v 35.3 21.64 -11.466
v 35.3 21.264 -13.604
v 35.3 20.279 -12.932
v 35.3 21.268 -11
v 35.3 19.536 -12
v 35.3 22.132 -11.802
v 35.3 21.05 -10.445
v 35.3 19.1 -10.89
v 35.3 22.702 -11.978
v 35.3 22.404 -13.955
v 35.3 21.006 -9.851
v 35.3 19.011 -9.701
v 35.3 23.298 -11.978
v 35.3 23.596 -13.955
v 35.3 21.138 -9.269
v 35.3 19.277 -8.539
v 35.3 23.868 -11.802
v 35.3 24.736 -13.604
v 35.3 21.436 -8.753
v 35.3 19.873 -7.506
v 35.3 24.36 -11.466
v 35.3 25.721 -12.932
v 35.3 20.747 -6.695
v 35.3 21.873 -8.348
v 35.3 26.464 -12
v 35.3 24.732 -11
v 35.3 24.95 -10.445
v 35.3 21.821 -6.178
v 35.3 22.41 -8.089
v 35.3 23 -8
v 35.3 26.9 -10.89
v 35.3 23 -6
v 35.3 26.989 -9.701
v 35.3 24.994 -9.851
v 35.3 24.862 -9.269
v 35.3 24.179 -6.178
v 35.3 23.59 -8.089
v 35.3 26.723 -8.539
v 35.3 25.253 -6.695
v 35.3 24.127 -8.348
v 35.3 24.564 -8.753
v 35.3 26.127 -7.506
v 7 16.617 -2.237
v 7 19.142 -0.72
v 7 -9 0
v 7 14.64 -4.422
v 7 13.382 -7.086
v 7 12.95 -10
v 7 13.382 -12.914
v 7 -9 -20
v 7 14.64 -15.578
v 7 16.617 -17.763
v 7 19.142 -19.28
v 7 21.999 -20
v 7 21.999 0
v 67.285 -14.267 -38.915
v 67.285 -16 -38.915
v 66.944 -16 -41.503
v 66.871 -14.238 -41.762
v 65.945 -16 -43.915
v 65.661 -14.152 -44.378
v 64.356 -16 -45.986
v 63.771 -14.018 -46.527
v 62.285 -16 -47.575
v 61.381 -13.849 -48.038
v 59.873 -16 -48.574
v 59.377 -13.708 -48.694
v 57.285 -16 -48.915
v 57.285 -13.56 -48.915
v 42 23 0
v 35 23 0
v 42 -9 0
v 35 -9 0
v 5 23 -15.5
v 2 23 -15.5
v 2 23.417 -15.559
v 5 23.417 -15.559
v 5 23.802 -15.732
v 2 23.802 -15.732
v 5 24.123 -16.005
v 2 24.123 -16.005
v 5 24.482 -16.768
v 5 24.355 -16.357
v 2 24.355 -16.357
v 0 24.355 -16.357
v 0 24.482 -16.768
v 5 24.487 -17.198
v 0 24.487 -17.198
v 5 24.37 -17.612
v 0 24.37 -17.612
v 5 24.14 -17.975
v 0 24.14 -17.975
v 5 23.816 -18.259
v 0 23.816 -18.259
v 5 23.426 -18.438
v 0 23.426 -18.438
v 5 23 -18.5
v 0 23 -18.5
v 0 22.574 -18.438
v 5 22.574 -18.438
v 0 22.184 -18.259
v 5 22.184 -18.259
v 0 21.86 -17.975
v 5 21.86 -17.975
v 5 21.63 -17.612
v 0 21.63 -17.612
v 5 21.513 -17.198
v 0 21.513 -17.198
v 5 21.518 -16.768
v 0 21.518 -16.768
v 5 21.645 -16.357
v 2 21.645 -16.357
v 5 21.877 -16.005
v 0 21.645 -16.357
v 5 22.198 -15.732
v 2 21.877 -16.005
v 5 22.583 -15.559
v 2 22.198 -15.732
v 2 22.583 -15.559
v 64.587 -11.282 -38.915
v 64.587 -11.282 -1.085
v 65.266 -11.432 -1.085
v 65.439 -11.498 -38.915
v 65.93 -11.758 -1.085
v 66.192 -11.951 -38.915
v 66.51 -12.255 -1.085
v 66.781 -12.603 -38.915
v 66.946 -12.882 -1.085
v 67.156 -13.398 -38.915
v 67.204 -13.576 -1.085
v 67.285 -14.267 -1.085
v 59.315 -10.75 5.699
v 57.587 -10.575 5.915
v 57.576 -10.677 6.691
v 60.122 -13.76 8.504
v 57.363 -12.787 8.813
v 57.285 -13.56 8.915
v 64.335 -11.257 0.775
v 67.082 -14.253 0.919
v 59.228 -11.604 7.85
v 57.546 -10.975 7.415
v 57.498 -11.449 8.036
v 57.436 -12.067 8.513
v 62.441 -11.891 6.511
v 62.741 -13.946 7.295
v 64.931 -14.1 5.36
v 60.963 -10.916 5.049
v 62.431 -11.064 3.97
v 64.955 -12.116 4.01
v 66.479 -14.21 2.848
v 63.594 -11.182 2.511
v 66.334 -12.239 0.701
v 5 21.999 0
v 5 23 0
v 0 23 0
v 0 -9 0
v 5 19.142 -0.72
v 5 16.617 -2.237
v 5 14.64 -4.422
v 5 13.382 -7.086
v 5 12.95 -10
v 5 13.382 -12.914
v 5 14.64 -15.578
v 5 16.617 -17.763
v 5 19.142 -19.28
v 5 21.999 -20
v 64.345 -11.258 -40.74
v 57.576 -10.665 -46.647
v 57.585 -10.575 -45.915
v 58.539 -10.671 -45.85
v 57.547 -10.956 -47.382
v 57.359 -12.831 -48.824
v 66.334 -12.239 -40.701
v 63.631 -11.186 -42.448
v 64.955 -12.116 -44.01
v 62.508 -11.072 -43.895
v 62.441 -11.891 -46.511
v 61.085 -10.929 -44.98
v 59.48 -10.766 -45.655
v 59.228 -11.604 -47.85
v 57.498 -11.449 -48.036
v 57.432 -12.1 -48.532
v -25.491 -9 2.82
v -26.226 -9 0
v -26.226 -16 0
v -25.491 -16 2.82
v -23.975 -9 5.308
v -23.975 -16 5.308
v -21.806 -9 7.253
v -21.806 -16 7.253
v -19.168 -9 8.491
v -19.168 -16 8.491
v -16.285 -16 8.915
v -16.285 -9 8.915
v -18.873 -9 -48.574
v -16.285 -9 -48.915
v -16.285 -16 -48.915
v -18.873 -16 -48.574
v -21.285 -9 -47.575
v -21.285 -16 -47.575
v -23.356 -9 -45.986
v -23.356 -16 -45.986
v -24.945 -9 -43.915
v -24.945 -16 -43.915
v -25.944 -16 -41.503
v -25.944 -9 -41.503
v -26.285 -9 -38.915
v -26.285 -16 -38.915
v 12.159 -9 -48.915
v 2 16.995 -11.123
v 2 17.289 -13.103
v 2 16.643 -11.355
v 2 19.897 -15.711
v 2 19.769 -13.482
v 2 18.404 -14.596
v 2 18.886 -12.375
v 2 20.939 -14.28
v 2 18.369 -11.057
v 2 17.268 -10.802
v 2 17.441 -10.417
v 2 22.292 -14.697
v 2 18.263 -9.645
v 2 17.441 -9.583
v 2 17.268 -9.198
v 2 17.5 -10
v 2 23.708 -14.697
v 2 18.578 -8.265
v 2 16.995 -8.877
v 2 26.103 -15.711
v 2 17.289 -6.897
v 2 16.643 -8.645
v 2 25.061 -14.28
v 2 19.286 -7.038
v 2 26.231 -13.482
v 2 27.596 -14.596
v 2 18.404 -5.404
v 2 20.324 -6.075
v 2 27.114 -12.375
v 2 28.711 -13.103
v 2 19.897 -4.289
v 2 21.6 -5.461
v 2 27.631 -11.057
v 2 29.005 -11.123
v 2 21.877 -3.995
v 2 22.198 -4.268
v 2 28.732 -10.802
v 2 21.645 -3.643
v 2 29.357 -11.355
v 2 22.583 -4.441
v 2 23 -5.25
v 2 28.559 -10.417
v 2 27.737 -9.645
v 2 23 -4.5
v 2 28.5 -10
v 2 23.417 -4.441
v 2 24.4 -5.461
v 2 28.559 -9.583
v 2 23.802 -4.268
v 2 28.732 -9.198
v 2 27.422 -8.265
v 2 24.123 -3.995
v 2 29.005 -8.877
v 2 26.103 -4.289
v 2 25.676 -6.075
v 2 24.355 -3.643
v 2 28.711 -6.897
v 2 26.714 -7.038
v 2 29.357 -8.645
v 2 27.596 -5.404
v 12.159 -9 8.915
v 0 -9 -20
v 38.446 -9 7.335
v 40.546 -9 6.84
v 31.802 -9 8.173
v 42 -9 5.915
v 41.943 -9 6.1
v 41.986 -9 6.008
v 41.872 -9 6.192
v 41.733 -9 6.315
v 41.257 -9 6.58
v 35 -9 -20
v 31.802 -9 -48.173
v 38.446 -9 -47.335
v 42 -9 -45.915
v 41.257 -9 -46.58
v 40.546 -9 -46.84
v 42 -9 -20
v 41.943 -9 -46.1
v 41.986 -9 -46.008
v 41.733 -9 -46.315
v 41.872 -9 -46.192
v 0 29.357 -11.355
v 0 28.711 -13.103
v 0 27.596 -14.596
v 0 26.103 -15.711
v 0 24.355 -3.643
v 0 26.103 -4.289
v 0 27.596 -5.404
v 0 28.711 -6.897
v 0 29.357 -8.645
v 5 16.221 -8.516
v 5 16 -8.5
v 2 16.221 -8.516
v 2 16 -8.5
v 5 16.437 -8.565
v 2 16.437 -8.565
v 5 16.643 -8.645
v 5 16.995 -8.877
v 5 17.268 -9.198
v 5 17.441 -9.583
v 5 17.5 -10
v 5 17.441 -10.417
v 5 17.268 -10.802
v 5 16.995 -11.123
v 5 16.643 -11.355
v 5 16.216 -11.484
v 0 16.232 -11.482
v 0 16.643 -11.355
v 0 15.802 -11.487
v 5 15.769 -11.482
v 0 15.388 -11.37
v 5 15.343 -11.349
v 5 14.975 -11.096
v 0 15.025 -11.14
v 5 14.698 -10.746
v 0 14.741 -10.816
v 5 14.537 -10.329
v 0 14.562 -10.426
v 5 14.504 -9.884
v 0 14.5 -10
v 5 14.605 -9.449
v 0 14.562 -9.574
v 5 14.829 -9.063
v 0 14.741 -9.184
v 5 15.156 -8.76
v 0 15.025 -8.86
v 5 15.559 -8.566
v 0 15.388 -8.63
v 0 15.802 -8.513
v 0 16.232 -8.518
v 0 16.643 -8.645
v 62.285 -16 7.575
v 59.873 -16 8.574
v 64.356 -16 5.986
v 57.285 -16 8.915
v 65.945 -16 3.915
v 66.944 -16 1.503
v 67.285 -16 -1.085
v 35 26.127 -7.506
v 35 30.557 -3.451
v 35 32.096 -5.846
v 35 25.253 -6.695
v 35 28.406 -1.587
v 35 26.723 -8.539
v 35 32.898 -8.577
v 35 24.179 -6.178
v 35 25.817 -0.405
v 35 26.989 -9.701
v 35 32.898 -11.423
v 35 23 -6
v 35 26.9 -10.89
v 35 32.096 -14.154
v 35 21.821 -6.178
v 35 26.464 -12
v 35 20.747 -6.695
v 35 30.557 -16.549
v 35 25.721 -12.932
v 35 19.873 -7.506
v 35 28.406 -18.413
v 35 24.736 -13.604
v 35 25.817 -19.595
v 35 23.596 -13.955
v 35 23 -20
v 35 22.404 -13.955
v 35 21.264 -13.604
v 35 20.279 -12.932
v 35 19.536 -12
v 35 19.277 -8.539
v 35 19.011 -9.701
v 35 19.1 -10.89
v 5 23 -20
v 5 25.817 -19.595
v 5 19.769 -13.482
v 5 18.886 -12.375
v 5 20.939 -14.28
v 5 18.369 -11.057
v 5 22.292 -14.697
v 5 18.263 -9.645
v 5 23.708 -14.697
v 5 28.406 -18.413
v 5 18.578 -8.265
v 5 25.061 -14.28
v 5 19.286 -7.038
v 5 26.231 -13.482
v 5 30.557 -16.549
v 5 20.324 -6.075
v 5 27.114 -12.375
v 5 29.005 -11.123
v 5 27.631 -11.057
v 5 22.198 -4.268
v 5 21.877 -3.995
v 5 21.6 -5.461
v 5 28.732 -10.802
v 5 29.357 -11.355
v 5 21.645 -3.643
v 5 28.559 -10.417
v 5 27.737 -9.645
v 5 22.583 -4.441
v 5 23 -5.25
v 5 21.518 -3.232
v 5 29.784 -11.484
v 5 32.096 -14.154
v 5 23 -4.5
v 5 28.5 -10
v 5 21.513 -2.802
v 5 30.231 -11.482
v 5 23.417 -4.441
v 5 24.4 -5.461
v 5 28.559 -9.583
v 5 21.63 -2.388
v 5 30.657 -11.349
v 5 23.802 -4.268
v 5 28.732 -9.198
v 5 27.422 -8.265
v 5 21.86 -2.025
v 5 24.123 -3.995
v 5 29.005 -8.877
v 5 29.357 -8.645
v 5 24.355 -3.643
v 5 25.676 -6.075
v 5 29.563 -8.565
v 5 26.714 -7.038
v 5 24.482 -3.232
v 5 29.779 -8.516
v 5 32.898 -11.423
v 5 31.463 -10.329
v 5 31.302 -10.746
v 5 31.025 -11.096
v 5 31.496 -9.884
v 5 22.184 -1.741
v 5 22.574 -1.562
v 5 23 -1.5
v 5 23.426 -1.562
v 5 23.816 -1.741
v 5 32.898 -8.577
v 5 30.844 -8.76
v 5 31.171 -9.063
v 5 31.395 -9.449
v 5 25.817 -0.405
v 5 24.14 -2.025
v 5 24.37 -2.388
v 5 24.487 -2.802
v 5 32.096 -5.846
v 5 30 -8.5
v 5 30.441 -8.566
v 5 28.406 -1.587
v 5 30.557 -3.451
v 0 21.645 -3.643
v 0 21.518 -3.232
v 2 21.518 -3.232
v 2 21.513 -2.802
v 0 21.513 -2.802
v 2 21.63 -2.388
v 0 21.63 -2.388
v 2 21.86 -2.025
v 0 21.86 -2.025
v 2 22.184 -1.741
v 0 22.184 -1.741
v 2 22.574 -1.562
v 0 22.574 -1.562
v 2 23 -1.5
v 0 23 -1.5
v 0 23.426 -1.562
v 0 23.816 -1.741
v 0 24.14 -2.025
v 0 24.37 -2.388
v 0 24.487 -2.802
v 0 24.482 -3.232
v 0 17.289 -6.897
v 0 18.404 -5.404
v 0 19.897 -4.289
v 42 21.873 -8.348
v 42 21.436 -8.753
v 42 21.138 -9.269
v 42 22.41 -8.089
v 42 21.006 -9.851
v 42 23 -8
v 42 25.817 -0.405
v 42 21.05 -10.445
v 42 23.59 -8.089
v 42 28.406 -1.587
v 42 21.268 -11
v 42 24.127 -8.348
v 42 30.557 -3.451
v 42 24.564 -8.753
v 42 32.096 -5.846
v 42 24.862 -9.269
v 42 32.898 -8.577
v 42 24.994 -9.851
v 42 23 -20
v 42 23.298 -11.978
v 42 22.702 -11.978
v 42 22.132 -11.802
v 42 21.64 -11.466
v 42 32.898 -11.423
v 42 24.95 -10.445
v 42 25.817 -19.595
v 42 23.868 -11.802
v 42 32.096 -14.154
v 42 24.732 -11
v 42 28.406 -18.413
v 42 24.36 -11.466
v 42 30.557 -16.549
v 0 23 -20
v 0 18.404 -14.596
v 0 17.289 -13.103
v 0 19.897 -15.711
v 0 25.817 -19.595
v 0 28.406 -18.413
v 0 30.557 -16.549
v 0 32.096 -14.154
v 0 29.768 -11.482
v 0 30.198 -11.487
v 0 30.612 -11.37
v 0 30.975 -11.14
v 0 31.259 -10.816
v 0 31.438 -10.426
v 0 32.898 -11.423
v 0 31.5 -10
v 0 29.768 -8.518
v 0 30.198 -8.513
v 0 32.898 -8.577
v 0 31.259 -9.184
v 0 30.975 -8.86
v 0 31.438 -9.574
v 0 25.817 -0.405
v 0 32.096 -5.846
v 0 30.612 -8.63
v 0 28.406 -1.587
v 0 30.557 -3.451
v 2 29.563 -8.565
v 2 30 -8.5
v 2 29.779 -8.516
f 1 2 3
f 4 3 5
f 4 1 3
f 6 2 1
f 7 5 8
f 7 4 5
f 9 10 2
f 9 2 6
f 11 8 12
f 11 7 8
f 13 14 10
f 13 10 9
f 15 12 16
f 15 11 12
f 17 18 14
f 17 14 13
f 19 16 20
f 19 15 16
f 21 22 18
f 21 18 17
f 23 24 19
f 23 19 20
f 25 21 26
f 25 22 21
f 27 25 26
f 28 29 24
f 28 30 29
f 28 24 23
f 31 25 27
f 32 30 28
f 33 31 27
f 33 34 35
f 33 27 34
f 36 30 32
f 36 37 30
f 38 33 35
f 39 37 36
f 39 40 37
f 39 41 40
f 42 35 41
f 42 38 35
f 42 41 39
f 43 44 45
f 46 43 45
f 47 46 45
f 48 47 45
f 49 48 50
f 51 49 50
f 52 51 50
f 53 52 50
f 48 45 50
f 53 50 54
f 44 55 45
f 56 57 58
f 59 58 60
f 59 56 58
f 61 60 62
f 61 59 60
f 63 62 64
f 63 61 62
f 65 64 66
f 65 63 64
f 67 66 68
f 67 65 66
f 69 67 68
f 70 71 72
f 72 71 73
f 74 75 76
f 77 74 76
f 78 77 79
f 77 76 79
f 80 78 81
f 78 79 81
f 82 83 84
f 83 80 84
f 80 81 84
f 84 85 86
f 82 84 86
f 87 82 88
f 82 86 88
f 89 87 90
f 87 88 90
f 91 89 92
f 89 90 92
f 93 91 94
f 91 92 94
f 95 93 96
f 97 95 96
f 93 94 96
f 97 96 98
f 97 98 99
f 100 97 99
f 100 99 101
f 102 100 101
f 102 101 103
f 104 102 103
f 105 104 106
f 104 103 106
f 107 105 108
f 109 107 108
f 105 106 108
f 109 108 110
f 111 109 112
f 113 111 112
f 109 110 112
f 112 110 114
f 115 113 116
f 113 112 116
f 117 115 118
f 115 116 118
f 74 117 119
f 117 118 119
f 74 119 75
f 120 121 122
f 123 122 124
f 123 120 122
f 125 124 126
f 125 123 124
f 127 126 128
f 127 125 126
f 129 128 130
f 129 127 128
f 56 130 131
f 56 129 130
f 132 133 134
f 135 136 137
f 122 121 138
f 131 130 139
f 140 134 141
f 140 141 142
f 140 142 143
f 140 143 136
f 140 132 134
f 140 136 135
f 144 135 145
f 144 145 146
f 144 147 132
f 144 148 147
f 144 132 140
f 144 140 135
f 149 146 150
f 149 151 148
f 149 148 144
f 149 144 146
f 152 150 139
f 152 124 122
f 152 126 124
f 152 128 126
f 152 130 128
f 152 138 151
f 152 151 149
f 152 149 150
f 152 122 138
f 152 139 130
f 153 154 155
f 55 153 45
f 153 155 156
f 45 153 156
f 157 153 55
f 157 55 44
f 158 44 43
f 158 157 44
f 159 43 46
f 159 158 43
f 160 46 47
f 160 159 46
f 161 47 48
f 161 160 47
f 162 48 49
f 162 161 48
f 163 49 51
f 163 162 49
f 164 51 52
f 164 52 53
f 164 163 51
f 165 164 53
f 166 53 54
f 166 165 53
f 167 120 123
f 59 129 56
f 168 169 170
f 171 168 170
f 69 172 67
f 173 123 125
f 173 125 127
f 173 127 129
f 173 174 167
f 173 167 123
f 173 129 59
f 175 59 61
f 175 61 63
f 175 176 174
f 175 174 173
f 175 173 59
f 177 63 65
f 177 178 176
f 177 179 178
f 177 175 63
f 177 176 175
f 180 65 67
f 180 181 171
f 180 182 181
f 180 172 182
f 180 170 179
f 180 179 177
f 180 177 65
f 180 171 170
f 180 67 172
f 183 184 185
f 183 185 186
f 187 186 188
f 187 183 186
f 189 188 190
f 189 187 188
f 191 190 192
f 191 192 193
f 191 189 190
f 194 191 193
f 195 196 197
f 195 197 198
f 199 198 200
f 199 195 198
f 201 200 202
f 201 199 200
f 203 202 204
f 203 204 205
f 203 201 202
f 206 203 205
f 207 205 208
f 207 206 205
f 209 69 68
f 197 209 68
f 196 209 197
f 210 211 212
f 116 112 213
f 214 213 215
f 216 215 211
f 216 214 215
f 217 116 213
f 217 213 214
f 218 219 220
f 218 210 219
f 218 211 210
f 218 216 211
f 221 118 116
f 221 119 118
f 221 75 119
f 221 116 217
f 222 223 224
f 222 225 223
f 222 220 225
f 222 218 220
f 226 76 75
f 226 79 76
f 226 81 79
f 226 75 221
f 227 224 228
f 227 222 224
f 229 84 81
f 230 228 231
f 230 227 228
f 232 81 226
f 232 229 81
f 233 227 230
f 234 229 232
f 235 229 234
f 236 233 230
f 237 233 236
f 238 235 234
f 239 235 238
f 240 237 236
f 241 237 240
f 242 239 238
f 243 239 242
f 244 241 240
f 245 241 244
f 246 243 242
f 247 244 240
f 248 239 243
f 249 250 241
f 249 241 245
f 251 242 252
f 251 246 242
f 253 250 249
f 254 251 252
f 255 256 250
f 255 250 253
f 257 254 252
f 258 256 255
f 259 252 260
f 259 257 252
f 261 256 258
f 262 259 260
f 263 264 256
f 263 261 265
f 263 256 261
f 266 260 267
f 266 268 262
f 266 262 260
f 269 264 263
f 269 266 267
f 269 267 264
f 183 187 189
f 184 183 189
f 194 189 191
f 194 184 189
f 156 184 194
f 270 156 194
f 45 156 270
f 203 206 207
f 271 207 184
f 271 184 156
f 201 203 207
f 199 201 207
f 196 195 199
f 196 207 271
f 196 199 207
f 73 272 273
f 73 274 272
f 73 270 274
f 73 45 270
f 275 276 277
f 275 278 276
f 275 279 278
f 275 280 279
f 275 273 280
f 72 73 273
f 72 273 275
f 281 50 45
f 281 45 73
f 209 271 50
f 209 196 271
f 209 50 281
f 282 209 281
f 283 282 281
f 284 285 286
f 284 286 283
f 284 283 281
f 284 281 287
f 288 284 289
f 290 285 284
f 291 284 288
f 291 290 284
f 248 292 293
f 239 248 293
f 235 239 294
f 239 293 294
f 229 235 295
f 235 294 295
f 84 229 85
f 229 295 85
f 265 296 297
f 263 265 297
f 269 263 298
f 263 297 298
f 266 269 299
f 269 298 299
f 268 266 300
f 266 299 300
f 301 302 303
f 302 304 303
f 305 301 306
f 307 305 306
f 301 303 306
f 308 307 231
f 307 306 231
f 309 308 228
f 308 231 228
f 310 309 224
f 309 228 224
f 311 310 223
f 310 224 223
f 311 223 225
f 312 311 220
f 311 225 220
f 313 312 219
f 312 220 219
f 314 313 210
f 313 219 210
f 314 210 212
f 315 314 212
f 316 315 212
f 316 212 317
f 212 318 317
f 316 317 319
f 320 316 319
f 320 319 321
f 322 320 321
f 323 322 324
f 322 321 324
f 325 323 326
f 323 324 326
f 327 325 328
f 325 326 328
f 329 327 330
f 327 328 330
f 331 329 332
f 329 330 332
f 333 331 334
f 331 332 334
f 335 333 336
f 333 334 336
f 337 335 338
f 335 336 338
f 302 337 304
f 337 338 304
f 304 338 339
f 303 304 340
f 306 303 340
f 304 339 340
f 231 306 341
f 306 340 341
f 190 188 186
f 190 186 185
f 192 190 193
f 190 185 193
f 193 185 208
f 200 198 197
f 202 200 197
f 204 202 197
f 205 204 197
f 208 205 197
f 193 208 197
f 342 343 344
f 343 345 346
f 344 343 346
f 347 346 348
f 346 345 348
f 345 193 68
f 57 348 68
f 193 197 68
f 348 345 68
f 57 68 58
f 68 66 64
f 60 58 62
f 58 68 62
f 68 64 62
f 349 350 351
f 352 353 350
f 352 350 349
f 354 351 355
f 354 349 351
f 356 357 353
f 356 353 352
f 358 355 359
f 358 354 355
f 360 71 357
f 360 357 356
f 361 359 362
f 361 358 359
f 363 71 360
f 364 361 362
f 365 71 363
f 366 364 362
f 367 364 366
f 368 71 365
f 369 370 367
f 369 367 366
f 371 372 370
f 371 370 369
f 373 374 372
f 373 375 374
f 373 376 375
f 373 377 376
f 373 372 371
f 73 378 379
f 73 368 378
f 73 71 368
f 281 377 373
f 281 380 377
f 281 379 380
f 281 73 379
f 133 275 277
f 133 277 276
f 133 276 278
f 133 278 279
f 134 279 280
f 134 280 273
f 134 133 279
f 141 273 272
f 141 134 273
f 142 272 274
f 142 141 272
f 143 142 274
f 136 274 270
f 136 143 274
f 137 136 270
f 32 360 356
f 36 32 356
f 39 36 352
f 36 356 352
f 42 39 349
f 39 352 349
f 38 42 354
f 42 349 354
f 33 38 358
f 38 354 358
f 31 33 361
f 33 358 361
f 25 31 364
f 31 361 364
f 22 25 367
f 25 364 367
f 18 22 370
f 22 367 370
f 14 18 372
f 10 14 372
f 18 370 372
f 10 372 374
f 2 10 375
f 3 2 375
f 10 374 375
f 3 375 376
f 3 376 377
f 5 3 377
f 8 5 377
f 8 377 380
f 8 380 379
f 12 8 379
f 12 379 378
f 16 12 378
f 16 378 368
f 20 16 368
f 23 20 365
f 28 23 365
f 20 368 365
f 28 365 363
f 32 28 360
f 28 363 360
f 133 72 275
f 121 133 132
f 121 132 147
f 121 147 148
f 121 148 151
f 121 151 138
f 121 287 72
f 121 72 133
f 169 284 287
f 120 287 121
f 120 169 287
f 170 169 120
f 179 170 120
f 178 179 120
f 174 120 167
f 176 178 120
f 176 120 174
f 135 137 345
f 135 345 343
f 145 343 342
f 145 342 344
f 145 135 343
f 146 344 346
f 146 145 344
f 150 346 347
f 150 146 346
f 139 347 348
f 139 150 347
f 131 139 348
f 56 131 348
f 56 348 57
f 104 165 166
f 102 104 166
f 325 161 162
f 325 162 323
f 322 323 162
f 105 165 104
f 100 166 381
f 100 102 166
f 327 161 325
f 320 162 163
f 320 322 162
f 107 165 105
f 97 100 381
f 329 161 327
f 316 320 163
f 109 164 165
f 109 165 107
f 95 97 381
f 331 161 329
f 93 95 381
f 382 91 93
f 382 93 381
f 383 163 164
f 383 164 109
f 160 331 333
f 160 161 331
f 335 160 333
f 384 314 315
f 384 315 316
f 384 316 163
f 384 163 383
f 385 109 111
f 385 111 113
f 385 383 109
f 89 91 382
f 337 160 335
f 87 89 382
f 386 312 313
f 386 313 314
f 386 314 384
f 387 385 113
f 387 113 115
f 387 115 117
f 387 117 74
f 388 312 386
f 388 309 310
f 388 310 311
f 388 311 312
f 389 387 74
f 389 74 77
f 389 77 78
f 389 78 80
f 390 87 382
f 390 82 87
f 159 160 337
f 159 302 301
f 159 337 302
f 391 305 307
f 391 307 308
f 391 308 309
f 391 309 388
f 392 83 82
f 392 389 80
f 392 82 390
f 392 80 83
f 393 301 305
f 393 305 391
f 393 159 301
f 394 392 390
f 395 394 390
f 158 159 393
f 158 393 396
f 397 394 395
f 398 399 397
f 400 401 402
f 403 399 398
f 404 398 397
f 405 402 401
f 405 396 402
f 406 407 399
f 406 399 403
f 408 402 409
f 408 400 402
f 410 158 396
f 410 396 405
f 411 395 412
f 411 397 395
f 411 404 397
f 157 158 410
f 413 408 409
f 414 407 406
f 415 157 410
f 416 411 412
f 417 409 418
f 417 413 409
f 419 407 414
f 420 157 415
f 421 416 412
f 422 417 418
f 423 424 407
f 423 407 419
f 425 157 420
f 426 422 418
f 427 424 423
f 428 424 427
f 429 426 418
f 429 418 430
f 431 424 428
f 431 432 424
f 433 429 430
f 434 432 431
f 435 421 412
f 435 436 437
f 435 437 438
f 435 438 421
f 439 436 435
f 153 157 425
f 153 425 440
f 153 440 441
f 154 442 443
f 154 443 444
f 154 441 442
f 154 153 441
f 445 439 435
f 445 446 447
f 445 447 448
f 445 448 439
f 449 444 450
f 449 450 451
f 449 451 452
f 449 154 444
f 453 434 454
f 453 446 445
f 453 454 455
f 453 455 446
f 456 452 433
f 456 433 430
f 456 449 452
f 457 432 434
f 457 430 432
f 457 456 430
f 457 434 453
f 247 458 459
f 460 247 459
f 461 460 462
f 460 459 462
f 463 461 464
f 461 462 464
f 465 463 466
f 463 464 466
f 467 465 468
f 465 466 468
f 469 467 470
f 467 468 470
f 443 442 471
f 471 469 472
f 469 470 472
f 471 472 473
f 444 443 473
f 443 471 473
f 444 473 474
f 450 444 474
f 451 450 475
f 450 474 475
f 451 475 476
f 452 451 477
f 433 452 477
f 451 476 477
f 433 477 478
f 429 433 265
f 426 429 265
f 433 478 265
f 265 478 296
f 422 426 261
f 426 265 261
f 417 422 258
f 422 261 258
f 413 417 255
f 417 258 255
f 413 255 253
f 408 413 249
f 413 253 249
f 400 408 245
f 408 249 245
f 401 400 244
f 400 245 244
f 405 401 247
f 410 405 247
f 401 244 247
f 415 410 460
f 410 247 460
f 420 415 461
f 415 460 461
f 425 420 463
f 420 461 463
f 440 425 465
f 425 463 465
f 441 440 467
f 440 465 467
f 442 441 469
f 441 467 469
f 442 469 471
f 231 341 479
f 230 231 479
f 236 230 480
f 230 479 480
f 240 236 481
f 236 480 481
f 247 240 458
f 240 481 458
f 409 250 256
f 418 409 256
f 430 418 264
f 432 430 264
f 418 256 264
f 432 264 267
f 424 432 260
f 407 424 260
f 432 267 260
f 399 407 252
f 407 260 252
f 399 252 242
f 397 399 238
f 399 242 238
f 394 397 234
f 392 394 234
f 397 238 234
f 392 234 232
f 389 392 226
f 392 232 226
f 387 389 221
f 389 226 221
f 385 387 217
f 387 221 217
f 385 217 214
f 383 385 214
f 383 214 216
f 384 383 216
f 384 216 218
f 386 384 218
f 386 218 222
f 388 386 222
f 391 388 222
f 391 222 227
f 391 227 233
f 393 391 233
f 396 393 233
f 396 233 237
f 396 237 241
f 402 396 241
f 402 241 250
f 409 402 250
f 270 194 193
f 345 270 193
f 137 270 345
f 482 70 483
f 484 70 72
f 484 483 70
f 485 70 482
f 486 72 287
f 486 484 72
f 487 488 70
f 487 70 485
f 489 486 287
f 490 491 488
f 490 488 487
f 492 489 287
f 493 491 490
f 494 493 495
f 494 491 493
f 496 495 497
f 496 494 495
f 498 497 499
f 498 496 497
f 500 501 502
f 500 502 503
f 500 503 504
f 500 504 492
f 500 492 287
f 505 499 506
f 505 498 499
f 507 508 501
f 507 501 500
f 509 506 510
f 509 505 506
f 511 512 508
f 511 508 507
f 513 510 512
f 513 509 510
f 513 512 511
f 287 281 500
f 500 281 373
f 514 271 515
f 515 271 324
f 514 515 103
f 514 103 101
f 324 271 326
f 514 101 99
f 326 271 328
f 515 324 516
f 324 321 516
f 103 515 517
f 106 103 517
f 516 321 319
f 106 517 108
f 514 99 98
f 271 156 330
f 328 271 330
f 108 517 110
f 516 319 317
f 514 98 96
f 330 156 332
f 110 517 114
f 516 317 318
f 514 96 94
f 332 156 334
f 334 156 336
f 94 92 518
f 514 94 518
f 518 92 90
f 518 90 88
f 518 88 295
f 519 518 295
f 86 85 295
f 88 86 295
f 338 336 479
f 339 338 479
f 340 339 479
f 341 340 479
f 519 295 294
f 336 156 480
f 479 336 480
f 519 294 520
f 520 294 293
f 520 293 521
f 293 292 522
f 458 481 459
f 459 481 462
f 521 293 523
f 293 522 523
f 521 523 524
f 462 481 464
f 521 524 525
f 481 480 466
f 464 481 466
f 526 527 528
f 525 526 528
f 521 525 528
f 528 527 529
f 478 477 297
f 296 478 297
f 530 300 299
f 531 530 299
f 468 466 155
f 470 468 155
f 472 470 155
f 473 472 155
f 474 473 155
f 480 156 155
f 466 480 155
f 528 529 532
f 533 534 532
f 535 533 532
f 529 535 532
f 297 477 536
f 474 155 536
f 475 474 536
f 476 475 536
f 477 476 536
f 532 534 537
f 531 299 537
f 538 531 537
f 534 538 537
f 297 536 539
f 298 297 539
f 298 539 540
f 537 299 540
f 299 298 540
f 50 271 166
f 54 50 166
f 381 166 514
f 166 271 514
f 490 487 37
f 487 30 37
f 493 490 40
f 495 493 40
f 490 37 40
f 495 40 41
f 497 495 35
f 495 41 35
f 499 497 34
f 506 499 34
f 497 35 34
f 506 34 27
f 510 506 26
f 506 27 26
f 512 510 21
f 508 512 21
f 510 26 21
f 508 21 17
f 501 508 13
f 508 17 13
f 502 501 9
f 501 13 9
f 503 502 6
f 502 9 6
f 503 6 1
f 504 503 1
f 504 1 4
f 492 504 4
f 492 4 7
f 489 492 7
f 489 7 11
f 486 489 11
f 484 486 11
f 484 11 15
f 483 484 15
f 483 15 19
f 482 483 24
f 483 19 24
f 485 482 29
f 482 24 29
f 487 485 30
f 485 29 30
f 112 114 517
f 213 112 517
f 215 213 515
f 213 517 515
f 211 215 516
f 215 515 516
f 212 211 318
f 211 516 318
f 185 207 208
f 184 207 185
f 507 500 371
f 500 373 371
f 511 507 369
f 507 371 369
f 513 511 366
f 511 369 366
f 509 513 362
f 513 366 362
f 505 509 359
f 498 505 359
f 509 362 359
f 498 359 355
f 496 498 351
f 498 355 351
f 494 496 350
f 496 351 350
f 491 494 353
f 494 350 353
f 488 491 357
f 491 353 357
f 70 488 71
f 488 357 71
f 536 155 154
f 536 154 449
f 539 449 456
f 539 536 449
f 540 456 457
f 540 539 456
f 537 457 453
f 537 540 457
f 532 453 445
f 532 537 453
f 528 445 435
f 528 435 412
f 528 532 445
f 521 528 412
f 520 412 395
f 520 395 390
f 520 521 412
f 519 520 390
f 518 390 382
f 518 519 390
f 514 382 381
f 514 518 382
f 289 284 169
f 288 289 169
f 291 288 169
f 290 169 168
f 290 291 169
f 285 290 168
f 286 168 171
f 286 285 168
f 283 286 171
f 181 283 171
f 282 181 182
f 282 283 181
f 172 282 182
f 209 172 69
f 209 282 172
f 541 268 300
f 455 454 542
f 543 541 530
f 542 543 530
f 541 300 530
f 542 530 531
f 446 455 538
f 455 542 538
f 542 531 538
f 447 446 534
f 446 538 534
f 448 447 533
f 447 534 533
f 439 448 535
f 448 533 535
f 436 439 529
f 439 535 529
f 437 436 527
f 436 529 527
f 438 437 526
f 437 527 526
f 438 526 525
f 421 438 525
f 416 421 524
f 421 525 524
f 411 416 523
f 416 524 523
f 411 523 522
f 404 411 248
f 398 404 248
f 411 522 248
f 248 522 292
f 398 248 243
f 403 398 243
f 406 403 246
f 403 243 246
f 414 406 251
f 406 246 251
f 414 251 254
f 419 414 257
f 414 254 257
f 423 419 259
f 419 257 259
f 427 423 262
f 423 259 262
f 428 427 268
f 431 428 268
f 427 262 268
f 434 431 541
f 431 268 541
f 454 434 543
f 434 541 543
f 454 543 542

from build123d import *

# Parameters (mm, degrees)
SKETCH1_W                = 41
SKETCH1_H                = 20
BOSS_EXTRUDE2_DEPTH      = 7
SKETCH3_R                = 10.05
CUT_EXTRUDE8_DEPTH       = 2
SKETCH4_R                = 1.5
SKETCH4_R_2              = 3
CUT_EXTRUDE9_DEPTH       = 29
SKETCH5_W                = 6
SKETCH5_H                = 20
SKETCH5_W_2              = 7
BOSS_EXTRUDE3_DEPTH      = 36
CUT_EXTRUDE10_DEPTH      = 36
SKETCH7_R                = 2
CUT_EXTRUDE11_DEPTH      = 51
SKETCH8_R                = 10.05
CUT_EXTRUDE12_DEPTH      = 2
SKETCH9_R                = 4.75
CUT_EXTRUDE13_DEPTH      = 3.25
SKETCH10_R               = 6.5
CUT_EXTRUDE14_DEPTH      = 2
CUT_EXTRUDE15_DEPTH      = 14
CUT_EXTRUDE15_DEPTH_BACK = 10
SKETCH12_R               = 1.5
CUT_EXTRUDE16_DEPTH      = 10
CUT_EXTRUDE17_DEPTH      = 10
MIRROR1_START            = 5
MIRROR1_DEPTH            = 2
MIRROR1_2_DEPTH          = 7
MIRROR1_3_DEPTH          = 5
CUT_EXTRUDE18_DEPTH      = 10
CUT_EXTRUDE18_DEPTH_BACK = 10
BOSS_EXTRUDE4_START      = 16
BOSS_EXTRUDE4_DEPTH      = 16
BOSS_EXTRUDE6_START      = -21
SKETCH16_W               = 28
SKETCH16_H               = 20
SKETCH16_R               = 1.5
SKETCH16_R_2             = 3
BOSS_EXTRUDE6_DEPTH      = 21
SKETCH18_W               = 28
SKETCH18_H               = 20
CUT_EXTRUDE21_DEPTH      = 16
CROQUIS2_R               = 3
CORTAR_EXTRUIR1_DEPTH    = 3
CROQUIS3_R               = 4
CORTAR_EXTRUIR2_DEPTH    = 0.3
SALIENTE_EXTRUIR1_DEPTH  = 1
CROQUIS5_R               = 2
CORTAR_EXTRUIR3_DEPTH    = 1
SALIENTE_EXTRUIR2_DEPTH  = 7
CORTAR_EXTRUIR4_DEPTH    = 76
REDONDEO1_R              = 3


# Read off the part's stored shape, not the designer's step: Mirror1
with BuildPart() as part:
    # Sketch1 → Boss-Extrude2 (new body)
    with BuildSketch(Plane(origin=(0, 0, 0), x_dir=(1, 0, 0), z_dir=(0, 1, 0))):
        with Locations((20.5, 10)):
            Rectangle(SKETCH1_W, SKETCH1_H)
    extrude(amount=BOSS_EXTRUDE2_DEPTH)

    # Sketch3 → Cut-Extrude8 (cut)
    with BuildSketch(Plane.XZ):
        with Locations((20.5, -10)):
            Circle(SKETCH3_R)
    extrude(amount=-CUT_EXTRUDE8_DEPTH, mode=Mode.SUBTRACT)

    # Sketch4 → Cut-Extrude9 (cut)
    with BuildSketch(Plane.XZ.offset(-2)):
        with Locations(Location((20.5, -2.95, 0), (0, 0, 270))):
            Circle(SKETCH4_R)
        with Locations(Location((27.55, -10, 0), (0, 0, 270))):
            Circle(SKETCH4_R)
        with Locations(Location((20.5, -17.05, 0), (0, 0, 270))):
            Circle(SKETCH4_R)
        with Locations(Location((13.45, -10, 0), (0, 0, 270))):
            Circle(SKETCH4_R)
        with Locations(Location((20.5, -10, 0), (0, 0, 270))):
            Circle(SKETCH4_R_2)
    extrude(amount=-CUT_EXTRUDE9_DEPTH, mode=Mode.SUBTRACT)

    # Sketch5 → Boss-Extrude3 (add)
    with BuildSketch(Plane(origin=(0, 7, 0), x_dir=(1, 0, 0), z_dir=(0, 1, 0))):
        with Locations((38, 10)):
            Rectangle(SKETCH5_W, SKETCH5_H)
        with Locations((3.5, 10)):
            Rectangle(SKETCH5_W_2, SKETCH5_H)
    extrude(amount=BOSS_EXTRUDE3_DEPTH)

    # Sketch6 → Cut-Extrude10 (cut)
    with BuildSketch(Plane.XY):
        Polygon((0, 33), (71.43253461, 33), (71.43253461, 55.308458538), (-13.966778087, 55.308458538), align=None)
    extrude(amount=-CUT_EXTRUDE10_DEPTH, mode=Mode.SUBTRACT)

    # Sketch7 → Cut-Extrude11 (cut)
    with BuildSketch(Plane.ZY):
        with Locations((-10, 23)):
            Circle(SKETCH7_R)
    extrude(amount=-CUT_EXTRUDE11_DEPTH, mode=Mode.SUBTRACT)

    # Sketch8 → Cut-Extrude12 (cut)
    with BuildSketch(Plane.ZY):
        with Locations((-10, 23)):
            Circle(SKETCH8_R)
    extrude(amount=-CUT_EXTRUDE12_DEPTH, mode=Mode.SUBTRACT)

    # Sketch9 → Cut-Extrude13 (cut)
    with BuildSketch(Plane.ZY.offset(-2)):
        with Locations((-10, 23)):
            Circle(SKETCH9_R)
    extrude(amount=-CUT_EXTRUDE13_DEPTH, mode=Mode.SUBTRACT)

    # Sketch10 → Cut-Extrude14 (cut)
    with BuildSketch(Plane(origin=(7, 0, 0), x_dir=(0, 0, -1), z_dir=(1, 0, 0))):
        with Locations((10, 23)):
            Circle(SKETCH10_R)
    extrude(amount=-CUT_EXTRUDE14_DEPTH, mode=Mode.SUBTRACT)

    # Sketch11 → Cut-Extrude15 (cut, two sides: drawn at the far end of the back side and taken through both)
    with BuildSketch(Plane.ZY.offset(-2).offset(-CUT_EXTRUDE15_DEPTH_BACK)):
        with BuildLine():
            Line((0, 23), (15.490351621, 23))
            Line((15.490351621, 23), (12.295560885, 45.157965149))
            Line((12.295560885, 45.157965149), (-24.464924867, 45.157965149))
            Line((-24.464924867, 45.157965149), (-29.902866546, 24.493786768))
            Line((-29.902866546, 24.493786768), (-20, 23))
            ThreePointArc((-20, 23), (-10, 33), (0, 23))
        make_face()
    extrude(amount=CUT_EXTRUDE15_DEPTH + CUT_EXTRUDE15_DEPTH_BACK, mode=Mode.SUBTRACT)

    # Sketch12 → Cut-Extrude16 (cut)
    with BuildSketch(Plane.ZY.offset(-2)):
        with Locations((-10, 30)):
            Circle(SKETCH12_R)
        with Locations((-3, 23)):
            Circle(SKETCH12_R)
        with Locations((-10, 16)):
            Circle(SKETCH12_R)
        with Locations((-17, 23)):
            Circle(SKETCH12_R)
    extrude(amount=-CUT_EXTRUDE16_DEPTH, mode=Mode.SUBTRACT)

    # Sketch13 → Cut-Extrude17 (cut)
    with BuildSketch(Plane(origin=(41, 0, 0), x_dir=(0, 0, -1), z_dir=(1, 0, 0))):
        with BuildLine():
            Line((20, 23), (26.17535893, 23))
            Line((26.17535893, 23), (24.098367316, 34.532076054))
            Line((24.098367316, 34.532076054), (-4.476002155, 34.532076054))
            Line((-4.476002155, 34.532076054), (-5.608906672, 23))
            Line((-5.608906672, 23), (0, 23))
            ThreePointArc((0, 23), (10, 33), (20, 23))
        make_face()
    extrude(amount=-CUT_EXTRUDE17_DEPTH, mode=Mode.SUBTRACT)

    # Mirror1 outline → Mirror1 (cut)
    with BuildSketch(Plane.YZ.offset(MIRROR1_START)):
        with BuildLine():
            Line((23, 0), (21.99875078, 0))
            ThreePointArc((21.99875078, 0), (12.95, -10), (21.99875078, -20))
            Line((21.99875078, -20), (23, -20))
            ThreePointArc((23, -20), (33, -10), (23, 0))
        make_face()
        with BuildLine():
            ThreePointArc((24.355261854, -16.357142857), (23, -18.5), (21.644738146, -16.357142857))
            ThreePointArc((21.644738146, -16.357142857), (18.403805922, -14.596194078), (16.642857143, -11.355261854))
            ThreePointArc((16.642857143, -11.355261854), (14.5, -10), (16.642857143, -8.644738146))
            ThreePointArc((16.642857143, -8.644738146), (18.403805922, -5.403805922), (21.644738146, -3.642857143))
            ThreePointArc((21.644738146, -3.642857143), (23, -1.5), (24.355261854, -3.642857143))
            ThreePointArc((24.355261854, -3.642857143), (27.596194078, -5.403805922), (29.357142857, -8.644738146))
            ThreePointArc((29.357142857, -8.644738146), (31.5, -10), (29.357142857, -11.355261854))
            ThreePointArc((29.357142857, -11.355261854), (27.596194078, -14.596194078), (24.355261854, -16.357142857))
        make_face(mode=Mode.SUBTRACT)
    extrude(amount=MIRROR1_DEPTH, mode=Mode.SUBTRACT)



with BuildPart() as body_2:
    # Mirror1 2 outline → Mirror1 2 (new body)
    with BuildSketch(Plane.YZ):
        with BuildLine():
            Line((43, 0), (24.00124922, 0))
            ThreePointArc((24.00124922, 0), (33.05, -10), (24.00124922, -20))
            Line((24.00124922, -20), (43, -20))
            Line((43, -20), (43, 0))
        make_face()
    extrude(amount=MIRROR1_2_DEPTH)


with BuildPart() as part_1:
    add(part.part)

    add(body_2.part)  # Mirror1 3 merges body 2
    # Mirror1 3 outline → Mirror1 3 (add)
    with BuildSketch(Plane.YZ):
        with BuildLine():
            ThreePointArc((21.99875078, 0), (12.95, -10), (21.99875078, -20))
            Line((21.99875078, -20), (24.00124922, -20))
            ThreePointArc((24.00124922, -20), (33.05, -10), (24.00124922, 0))
            Line((24.00124922, 0), (21.99875078, 0))
        make_face()
        with BuildLine():
            ThreePointArc((24.355261854, -16.357142857), (23, -18.5), (21.644738146, -16.357142857))
            ThreePointArc((21.644738146, -16.357142857), (18.403805922, -14.596194078), (16.642857143, -11.355261854))
            ThreePointArc((16.642857143, -11.355261854), (14.5, -10), (16.642857143, -8.644738146))
            ThreePointArc((16.642857143, -8.644738146), (18.403805922, -5.403805922), (21.644738146, -3.642857143))
            ThreePointArc((21.644738146, -3.642857143), (23, -1.5), (24.355261854, -3.642857143))
            ThreePointArc((24.355261854, -3.642857143), (27.596194078, -5.403805922), (29.357142857, -8.644738146))
            ThreePointArc((29.357142857, -8.644738146), (31.5, -10), (29.357142857, -11.355261854))
            ThreePointArc((29.357142857, -11.355261854), (27.596194078, -14.596194078), (24.355261854, -16.357142857))
        make_face(mode=Mode.SUBTRACT)
    extrude(amount=MIRROR1_3_DEPTH)

    # Sketch14 → Cut-Extrude18 (cut, two sides: drawn at the far end of the back side and taken through both)
    with BuildSketch(Plane(origin=(5, 0, 0), x_dir=(0, 0, -1), z_dir=(1, 0, 0)).offset(-CUT_EXTRUDE18_DEPTH_BACK)):
        with BuildLine():
            Line((20, 23), (39.442144398, 23))
            Line((39.442144398, 23), (24.053498228, 52.618460363))
            Line((24.053498228, 52.618460363), (-15.863160605, 48.721271778))
            Line((-15.863160605, 48.721271778), (-25.901373625, 22.149531431))
            Line((-25.901373625, 22.149531431), (0, 23))
            ThreePointArc((0, 23), (10, 33), (20, 23))
        make_face()
    extrude(amount=CUT_EXTRUDE18_DEPTH + CUT_EXTRUDE18_DEPTH_BACK, mode=Mode.SUBTRACT)

    # Sketch15 → Boss-Extrude4 (add)
    with BuildSketch(Plane.XZ.offset(BOSS_EXTRUDE4_START)):
        with BuildLine():
            Line((21.50124922, 0), (41, 0))
            Line((41, 0), (41, -20))
            Line((41, -20), (21.50124922, -20))
            ThreePointArc((21.50124922, -20), (30.55, -10), (21.50124922, 0))
        make_face()
        with BuildLine():
            Line((0, 0), (19.49875078, 0))
            ThreePointArc((19.49875078, 0), (10.45, -10), (19.49875078, -20))
            Line((19.49875078, -20), (0, -20))
            Line((0, -20), (0, 0))
        make_face()
    extrude(amount=-BOSS_EXTRUDE4_DEPTH)

    # Sketch16 → Boss-Extrude6 (add)
    with BuildSketch(Plane(origin=(0, 7, 0), x_dir=(1, 0, 0), z_dir=(0, 1, 0)).offset(BOSS_EXTRUDE6_START)):
        with Locations((21, 10)):
            Rectangle(SKETCH16_W, SKETCH16_H)
        with Locations(Location((27.55, 10, 0), (0, 0, 90))):
            Circle(SKETCH16_R, mode=Mode.SUBTRACT)
        with Locations(Location((20.5, 10, 0), (0, 0, 90))):
            Circle(SKETCH16_R_2, mode=Mode.SUBTRACT)
        with Locations(Location((13.45, 10, 0), (0, 0, 90))):
            Circle(SKETCH16_R, mode=Mode.SUBTRACT)
        with Locations(Location((20.5, 17.05, 0), (0, 0, 90))):
            Circle(SKETCH16_R, mode=Mode.SUBTRACT)
        with Locations(Location((20.5, 2.95, 0), (0, 0, 90))):
            Circle(SKETCH16_R, mode=Mode.SUBTRACT)
    extrude(amount=BOSS_EXTRUDE6_DEPTH)

    # Sketch18 → Cut-Extrude21 (cut)
    with BuildSketch(Plane(origin=(0, 7, 0), x_dir=(1, 0, 0), z_dir=(0, 1, 0))):
        with Locations((21, 10)):
            Rectangle(SKETCH18_W, SKETCH18_H)
    extrude(amount=-CUT_EXTRUDE21_DEPTH, mode=Mode.SUBTRACT)

    # Croquis2 → Cortar-Extruir1 (cut)
    with BuildSketch(Plane(origin=(0, -9, 0), x_dir=(1, 0, 0), z_dir=(0, 1, 0))):
        with Locations(Location((27.55, 10, 0), (0, 0, 270))):
            Circle(CROQUIS2_R)
        with Locations((20.5, 17.05)):
            Circle(CROQUIS2_R)
        with Locations(Location((13.45, 10, 0), (0, 0, 270))):
            Circle(CROQUIS2_R)
        with Locations((20.5, 2.95)):
            Circle(CROQUIS2_R)
    extrude(amount=-CORTAR_EXTRUIR1_DEPTH, mode=Mode.SUBTRACT)

    # Croquis3 → Cortar-Extruir2 (cut)
    with BuildSketch(Plane.ZY.offset(-35)):
        with Locations((-10, 23)):
            Circle(CROQUIS3_R)
    extrude(amount=-CORTAR_EXTRUIR2_DEPTH, mode=Mode.SUBTRACT)

    # Croquis4 → Saliente-Extruir1 (add)
    with BuildSketch(Plane(origin=(41, 0, 0), x_dir=(0, 0, -1), z_dir=(1, 0, 0))):
        with BuildLine():
            Line((20, -16), (20, 23))
            ThreePointArc((20, 23), (10, 33), (0, 23))
            Line((0, 23), (0, -16))
            Line((0, -16), (20, -16))
        make_face()
    extrude(amount=SALIENTE_EXTRUIR1_DEPTH)

    # Croquis5 → Cortar-Extruir3 (cut)
    with BuildSketch(Plane.ZY.offset(-41)):
        with Locations((-10, 23)):
            Circle(CROQUIS5_R)
    extrude(amount=-CORTAR_EXTRUIR3_DEPTH, mode=Mode.SUBTRACT)

    # Croquis6 → Saliente-Extruir2 (add)
    with BuildSketch(Plane(origin=(0, -9, 0), x_dir=(1, 0, 0), z_dir=(0, 1, 0))):
        with BuildLine():
            Line((57.285, 48.915), (-16.285, 48.915))
            ThreePointArc((-16.285, 48.915), (-23.356067812, 45.986067812), (-26.285, 38.915))
            Line((-26.285, 38.915), (-26.22596449, 0))
            ThreePointArc((-26.22596449, 0), (-22.961451153, -6.359796841), (-16.285, -8.915))
            Line((-16.285, -8.915), (57.285, -8.915))
            ThreePointArc((57.285, -8.915), (64.356067812, -5.986067812), (67.285, 1.085))
            Line((67.285, 1.085), (67.285, 38.915))
            ThreePointArc((67.285, 38.915), (64.356067812, 45.986067812), (57.285, 48.915))
        make_face()
    extrude(amount=-SALIENTE_EXTRUIR2_DEPTH)

    # Croquis8 → Cortar-Extruir4 (cut)
    with BuildSketch(Plane(origin=(0, 0, -48.915), x_dir=(-1, 0, 0), z_dir=(0, 0, -1))):
        Polygon((-42, -9), (-78.538129526, -12.692039661), (-74.698456834, 7.097042671), align=None)
    extrude(amount=-CORTAR_EXTRUIR4_DEPTH, mode=Mode.SUBTRACT)

    # Redondeo1
    redondeo1_edges = [part_1.edges().sort_by_distance(p)[0] for p in [
        (64.347083214, -11.258088156, -45.995041009),
        (49.6425, -9.772245692, 8.915),
        (64.347083214, -11.258088156, 5.995041009),
        (67.285, -11.554953525, -20),
        (49.6425, -9.772245692, -48.915),
    ]]
    fillet(redondeo1_edges, radius=REDONDEO1_R)


solid = part_1.part
